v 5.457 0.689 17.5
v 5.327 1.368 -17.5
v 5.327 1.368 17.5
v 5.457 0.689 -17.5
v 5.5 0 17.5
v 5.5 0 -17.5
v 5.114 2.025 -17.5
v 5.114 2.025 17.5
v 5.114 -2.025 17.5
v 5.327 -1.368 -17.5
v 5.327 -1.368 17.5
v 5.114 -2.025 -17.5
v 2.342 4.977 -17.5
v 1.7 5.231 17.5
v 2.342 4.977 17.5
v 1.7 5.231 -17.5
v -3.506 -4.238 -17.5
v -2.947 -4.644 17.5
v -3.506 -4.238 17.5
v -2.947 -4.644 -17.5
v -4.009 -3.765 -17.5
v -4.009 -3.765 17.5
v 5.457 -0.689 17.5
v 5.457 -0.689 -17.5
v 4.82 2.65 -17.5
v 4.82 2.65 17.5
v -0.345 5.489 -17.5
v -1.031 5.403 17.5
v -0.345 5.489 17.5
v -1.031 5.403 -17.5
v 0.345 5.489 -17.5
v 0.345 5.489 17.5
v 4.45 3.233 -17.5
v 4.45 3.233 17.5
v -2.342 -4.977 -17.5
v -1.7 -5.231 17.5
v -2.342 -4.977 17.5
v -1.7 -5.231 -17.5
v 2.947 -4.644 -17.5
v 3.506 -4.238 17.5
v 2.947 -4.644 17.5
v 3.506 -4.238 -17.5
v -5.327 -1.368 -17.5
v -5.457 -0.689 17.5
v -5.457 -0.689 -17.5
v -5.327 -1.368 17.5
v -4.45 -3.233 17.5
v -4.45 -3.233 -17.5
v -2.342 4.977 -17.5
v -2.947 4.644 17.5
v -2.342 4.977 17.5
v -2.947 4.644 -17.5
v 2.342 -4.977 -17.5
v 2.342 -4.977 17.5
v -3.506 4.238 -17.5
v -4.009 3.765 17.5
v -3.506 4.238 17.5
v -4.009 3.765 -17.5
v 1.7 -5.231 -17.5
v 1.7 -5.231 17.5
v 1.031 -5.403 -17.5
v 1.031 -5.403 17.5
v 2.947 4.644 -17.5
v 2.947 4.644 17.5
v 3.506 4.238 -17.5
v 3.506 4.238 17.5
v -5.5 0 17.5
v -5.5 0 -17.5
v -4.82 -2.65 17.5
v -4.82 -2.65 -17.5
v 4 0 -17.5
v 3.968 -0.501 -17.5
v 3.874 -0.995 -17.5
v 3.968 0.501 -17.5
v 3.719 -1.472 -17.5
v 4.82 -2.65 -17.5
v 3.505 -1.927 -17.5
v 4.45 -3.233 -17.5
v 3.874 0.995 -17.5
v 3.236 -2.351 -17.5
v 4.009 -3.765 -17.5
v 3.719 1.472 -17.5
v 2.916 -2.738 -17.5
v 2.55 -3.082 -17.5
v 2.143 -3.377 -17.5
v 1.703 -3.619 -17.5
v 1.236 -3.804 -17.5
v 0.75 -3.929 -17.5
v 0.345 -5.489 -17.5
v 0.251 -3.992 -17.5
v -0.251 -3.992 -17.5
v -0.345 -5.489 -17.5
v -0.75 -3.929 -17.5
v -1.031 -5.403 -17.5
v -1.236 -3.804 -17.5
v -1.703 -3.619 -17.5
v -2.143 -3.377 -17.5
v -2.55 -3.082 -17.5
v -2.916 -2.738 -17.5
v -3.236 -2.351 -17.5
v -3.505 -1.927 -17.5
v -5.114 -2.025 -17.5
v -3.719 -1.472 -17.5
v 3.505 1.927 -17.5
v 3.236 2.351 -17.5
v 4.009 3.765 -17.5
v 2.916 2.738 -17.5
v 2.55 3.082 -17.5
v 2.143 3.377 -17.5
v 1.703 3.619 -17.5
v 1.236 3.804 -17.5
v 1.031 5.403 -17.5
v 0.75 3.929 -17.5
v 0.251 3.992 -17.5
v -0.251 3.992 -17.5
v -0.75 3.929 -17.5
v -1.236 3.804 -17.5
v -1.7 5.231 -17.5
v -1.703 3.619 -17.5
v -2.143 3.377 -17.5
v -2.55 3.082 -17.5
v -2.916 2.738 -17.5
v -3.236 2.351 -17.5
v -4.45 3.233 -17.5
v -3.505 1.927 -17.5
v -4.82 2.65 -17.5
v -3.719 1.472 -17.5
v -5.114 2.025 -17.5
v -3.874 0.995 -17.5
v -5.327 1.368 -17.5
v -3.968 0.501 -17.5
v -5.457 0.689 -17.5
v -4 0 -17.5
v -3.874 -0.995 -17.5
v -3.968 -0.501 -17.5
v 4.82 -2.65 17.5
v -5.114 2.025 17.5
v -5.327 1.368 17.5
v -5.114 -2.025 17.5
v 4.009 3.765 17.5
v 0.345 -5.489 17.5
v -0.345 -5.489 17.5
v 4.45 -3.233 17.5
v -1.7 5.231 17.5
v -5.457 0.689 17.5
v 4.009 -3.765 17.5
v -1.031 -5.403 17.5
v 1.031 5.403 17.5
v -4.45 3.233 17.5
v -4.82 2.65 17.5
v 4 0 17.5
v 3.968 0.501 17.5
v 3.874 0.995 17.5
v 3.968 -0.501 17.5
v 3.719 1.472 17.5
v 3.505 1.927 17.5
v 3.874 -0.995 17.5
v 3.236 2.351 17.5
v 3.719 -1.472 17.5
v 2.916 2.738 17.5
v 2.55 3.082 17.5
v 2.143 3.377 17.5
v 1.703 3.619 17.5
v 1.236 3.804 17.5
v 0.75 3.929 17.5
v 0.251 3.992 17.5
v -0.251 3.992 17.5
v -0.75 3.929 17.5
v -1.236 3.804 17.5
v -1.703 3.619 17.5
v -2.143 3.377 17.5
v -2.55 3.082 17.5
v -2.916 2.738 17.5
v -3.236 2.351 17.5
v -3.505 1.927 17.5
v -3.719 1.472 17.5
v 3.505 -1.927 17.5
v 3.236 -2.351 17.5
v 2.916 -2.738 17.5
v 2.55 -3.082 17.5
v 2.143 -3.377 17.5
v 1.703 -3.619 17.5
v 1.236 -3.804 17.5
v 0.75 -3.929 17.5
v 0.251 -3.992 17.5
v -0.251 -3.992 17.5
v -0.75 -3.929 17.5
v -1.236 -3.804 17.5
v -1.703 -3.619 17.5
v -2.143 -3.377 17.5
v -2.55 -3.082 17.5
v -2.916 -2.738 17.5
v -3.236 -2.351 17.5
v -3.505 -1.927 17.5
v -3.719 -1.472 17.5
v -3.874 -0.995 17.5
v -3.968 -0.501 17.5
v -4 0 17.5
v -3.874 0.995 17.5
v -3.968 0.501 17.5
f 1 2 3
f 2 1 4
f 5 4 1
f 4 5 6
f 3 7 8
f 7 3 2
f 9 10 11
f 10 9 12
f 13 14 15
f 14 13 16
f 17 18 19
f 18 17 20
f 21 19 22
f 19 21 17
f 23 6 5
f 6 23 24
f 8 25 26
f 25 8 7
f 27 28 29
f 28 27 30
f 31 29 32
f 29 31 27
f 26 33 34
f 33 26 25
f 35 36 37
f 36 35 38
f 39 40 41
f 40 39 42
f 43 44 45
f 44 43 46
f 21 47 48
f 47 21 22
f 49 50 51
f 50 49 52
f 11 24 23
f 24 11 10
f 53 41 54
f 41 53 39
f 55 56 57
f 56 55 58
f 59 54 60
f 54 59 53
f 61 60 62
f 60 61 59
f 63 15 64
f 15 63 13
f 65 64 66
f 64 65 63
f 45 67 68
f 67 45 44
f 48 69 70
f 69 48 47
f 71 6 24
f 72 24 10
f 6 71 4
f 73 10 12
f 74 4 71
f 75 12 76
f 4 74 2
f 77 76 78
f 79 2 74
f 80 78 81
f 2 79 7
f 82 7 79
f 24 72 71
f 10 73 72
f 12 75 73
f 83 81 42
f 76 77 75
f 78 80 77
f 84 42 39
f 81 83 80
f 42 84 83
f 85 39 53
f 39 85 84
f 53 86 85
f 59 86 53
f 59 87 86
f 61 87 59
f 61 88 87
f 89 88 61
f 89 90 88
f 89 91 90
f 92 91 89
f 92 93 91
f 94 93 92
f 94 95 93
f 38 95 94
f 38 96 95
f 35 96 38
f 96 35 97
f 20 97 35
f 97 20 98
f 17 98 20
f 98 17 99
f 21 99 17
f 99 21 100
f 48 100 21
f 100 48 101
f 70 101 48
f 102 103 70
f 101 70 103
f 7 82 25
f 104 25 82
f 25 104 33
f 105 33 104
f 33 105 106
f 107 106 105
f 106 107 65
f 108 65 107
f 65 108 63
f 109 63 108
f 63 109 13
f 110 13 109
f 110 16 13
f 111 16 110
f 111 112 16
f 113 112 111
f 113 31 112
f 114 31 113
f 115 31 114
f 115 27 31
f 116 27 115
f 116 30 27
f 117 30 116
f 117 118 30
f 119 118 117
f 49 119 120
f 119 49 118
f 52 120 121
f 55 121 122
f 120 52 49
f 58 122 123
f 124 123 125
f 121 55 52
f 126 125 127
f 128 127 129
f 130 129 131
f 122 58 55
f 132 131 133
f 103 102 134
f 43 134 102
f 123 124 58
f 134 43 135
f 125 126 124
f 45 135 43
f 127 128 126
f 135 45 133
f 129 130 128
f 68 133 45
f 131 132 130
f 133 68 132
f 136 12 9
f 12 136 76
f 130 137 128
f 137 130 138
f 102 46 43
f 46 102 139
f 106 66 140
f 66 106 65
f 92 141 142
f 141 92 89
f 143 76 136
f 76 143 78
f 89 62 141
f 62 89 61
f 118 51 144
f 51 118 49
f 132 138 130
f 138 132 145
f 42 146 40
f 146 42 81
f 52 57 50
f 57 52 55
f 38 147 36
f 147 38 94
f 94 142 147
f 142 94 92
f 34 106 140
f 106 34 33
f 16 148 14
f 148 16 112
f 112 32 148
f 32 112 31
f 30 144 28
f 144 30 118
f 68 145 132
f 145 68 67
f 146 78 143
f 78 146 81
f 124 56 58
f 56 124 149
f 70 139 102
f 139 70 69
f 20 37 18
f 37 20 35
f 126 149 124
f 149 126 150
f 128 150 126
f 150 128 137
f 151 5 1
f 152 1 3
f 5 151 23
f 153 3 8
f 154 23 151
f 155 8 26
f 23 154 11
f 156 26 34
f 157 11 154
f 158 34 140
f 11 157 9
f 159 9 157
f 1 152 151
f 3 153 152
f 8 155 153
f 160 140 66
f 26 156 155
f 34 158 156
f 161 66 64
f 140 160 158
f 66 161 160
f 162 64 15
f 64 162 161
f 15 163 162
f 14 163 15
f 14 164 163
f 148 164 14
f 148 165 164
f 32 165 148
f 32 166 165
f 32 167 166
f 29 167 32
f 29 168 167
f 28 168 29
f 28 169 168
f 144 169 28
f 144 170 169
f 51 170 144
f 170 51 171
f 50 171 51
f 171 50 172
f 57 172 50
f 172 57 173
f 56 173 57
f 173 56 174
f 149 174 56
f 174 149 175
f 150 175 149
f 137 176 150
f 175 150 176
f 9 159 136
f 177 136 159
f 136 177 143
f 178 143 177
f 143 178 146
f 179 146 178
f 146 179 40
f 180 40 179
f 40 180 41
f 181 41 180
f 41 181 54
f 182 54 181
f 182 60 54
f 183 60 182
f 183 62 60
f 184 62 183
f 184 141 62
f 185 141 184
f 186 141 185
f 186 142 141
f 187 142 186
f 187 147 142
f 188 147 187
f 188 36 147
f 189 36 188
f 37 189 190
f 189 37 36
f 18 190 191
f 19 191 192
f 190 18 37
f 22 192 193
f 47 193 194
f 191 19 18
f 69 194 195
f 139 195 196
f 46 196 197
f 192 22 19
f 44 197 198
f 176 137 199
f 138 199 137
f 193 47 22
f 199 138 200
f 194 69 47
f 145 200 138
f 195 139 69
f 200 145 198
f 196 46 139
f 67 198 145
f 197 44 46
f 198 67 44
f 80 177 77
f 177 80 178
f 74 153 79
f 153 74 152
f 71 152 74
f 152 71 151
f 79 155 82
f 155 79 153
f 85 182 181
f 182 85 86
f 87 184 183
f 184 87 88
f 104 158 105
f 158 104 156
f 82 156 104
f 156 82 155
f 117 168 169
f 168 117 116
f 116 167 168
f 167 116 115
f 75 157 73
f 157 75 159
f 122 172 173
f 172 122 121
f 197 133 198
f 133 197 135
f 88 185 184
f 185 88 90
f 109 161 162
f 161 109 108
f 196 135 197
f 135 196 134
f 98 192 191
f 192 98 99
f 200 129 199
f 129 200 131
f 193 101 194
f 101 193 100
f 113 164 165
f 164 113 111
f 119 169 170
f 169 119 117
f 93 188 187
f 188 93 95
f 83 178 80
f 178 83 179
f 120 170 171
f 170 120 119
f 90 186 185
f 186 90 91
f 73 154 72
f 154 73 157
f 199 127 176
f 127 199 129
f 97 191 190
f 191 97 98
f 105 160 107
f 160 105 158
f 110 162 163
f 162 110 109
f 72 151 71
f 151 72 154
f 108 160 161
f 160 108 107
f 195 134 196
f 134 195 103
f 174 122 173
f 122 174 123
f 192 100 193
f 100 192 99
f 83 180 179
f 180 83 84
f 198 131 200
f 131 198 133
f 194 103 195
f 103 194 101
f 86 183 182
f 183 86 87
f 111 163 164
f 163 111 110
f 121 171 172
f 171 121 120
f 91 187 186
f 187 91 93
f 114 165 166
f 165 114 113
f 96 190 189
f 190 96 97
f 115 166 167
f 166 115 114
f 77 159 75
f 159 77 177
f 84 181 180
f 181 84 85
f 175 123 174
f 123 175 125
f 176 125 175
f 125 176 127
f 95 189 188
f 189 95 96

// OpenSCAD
$fn = 50;


difference() {
	union() {
		translate(v = [0, 0, -17.5000000000]) {
			cylinder(h = 35, r = 5.5000000000);
		}
	}
	union() {
		translate(v = [0, 0, -100.0000000000]) {
			cylinder(h = 200, r = 4.0000000000);
		}
	}
}
